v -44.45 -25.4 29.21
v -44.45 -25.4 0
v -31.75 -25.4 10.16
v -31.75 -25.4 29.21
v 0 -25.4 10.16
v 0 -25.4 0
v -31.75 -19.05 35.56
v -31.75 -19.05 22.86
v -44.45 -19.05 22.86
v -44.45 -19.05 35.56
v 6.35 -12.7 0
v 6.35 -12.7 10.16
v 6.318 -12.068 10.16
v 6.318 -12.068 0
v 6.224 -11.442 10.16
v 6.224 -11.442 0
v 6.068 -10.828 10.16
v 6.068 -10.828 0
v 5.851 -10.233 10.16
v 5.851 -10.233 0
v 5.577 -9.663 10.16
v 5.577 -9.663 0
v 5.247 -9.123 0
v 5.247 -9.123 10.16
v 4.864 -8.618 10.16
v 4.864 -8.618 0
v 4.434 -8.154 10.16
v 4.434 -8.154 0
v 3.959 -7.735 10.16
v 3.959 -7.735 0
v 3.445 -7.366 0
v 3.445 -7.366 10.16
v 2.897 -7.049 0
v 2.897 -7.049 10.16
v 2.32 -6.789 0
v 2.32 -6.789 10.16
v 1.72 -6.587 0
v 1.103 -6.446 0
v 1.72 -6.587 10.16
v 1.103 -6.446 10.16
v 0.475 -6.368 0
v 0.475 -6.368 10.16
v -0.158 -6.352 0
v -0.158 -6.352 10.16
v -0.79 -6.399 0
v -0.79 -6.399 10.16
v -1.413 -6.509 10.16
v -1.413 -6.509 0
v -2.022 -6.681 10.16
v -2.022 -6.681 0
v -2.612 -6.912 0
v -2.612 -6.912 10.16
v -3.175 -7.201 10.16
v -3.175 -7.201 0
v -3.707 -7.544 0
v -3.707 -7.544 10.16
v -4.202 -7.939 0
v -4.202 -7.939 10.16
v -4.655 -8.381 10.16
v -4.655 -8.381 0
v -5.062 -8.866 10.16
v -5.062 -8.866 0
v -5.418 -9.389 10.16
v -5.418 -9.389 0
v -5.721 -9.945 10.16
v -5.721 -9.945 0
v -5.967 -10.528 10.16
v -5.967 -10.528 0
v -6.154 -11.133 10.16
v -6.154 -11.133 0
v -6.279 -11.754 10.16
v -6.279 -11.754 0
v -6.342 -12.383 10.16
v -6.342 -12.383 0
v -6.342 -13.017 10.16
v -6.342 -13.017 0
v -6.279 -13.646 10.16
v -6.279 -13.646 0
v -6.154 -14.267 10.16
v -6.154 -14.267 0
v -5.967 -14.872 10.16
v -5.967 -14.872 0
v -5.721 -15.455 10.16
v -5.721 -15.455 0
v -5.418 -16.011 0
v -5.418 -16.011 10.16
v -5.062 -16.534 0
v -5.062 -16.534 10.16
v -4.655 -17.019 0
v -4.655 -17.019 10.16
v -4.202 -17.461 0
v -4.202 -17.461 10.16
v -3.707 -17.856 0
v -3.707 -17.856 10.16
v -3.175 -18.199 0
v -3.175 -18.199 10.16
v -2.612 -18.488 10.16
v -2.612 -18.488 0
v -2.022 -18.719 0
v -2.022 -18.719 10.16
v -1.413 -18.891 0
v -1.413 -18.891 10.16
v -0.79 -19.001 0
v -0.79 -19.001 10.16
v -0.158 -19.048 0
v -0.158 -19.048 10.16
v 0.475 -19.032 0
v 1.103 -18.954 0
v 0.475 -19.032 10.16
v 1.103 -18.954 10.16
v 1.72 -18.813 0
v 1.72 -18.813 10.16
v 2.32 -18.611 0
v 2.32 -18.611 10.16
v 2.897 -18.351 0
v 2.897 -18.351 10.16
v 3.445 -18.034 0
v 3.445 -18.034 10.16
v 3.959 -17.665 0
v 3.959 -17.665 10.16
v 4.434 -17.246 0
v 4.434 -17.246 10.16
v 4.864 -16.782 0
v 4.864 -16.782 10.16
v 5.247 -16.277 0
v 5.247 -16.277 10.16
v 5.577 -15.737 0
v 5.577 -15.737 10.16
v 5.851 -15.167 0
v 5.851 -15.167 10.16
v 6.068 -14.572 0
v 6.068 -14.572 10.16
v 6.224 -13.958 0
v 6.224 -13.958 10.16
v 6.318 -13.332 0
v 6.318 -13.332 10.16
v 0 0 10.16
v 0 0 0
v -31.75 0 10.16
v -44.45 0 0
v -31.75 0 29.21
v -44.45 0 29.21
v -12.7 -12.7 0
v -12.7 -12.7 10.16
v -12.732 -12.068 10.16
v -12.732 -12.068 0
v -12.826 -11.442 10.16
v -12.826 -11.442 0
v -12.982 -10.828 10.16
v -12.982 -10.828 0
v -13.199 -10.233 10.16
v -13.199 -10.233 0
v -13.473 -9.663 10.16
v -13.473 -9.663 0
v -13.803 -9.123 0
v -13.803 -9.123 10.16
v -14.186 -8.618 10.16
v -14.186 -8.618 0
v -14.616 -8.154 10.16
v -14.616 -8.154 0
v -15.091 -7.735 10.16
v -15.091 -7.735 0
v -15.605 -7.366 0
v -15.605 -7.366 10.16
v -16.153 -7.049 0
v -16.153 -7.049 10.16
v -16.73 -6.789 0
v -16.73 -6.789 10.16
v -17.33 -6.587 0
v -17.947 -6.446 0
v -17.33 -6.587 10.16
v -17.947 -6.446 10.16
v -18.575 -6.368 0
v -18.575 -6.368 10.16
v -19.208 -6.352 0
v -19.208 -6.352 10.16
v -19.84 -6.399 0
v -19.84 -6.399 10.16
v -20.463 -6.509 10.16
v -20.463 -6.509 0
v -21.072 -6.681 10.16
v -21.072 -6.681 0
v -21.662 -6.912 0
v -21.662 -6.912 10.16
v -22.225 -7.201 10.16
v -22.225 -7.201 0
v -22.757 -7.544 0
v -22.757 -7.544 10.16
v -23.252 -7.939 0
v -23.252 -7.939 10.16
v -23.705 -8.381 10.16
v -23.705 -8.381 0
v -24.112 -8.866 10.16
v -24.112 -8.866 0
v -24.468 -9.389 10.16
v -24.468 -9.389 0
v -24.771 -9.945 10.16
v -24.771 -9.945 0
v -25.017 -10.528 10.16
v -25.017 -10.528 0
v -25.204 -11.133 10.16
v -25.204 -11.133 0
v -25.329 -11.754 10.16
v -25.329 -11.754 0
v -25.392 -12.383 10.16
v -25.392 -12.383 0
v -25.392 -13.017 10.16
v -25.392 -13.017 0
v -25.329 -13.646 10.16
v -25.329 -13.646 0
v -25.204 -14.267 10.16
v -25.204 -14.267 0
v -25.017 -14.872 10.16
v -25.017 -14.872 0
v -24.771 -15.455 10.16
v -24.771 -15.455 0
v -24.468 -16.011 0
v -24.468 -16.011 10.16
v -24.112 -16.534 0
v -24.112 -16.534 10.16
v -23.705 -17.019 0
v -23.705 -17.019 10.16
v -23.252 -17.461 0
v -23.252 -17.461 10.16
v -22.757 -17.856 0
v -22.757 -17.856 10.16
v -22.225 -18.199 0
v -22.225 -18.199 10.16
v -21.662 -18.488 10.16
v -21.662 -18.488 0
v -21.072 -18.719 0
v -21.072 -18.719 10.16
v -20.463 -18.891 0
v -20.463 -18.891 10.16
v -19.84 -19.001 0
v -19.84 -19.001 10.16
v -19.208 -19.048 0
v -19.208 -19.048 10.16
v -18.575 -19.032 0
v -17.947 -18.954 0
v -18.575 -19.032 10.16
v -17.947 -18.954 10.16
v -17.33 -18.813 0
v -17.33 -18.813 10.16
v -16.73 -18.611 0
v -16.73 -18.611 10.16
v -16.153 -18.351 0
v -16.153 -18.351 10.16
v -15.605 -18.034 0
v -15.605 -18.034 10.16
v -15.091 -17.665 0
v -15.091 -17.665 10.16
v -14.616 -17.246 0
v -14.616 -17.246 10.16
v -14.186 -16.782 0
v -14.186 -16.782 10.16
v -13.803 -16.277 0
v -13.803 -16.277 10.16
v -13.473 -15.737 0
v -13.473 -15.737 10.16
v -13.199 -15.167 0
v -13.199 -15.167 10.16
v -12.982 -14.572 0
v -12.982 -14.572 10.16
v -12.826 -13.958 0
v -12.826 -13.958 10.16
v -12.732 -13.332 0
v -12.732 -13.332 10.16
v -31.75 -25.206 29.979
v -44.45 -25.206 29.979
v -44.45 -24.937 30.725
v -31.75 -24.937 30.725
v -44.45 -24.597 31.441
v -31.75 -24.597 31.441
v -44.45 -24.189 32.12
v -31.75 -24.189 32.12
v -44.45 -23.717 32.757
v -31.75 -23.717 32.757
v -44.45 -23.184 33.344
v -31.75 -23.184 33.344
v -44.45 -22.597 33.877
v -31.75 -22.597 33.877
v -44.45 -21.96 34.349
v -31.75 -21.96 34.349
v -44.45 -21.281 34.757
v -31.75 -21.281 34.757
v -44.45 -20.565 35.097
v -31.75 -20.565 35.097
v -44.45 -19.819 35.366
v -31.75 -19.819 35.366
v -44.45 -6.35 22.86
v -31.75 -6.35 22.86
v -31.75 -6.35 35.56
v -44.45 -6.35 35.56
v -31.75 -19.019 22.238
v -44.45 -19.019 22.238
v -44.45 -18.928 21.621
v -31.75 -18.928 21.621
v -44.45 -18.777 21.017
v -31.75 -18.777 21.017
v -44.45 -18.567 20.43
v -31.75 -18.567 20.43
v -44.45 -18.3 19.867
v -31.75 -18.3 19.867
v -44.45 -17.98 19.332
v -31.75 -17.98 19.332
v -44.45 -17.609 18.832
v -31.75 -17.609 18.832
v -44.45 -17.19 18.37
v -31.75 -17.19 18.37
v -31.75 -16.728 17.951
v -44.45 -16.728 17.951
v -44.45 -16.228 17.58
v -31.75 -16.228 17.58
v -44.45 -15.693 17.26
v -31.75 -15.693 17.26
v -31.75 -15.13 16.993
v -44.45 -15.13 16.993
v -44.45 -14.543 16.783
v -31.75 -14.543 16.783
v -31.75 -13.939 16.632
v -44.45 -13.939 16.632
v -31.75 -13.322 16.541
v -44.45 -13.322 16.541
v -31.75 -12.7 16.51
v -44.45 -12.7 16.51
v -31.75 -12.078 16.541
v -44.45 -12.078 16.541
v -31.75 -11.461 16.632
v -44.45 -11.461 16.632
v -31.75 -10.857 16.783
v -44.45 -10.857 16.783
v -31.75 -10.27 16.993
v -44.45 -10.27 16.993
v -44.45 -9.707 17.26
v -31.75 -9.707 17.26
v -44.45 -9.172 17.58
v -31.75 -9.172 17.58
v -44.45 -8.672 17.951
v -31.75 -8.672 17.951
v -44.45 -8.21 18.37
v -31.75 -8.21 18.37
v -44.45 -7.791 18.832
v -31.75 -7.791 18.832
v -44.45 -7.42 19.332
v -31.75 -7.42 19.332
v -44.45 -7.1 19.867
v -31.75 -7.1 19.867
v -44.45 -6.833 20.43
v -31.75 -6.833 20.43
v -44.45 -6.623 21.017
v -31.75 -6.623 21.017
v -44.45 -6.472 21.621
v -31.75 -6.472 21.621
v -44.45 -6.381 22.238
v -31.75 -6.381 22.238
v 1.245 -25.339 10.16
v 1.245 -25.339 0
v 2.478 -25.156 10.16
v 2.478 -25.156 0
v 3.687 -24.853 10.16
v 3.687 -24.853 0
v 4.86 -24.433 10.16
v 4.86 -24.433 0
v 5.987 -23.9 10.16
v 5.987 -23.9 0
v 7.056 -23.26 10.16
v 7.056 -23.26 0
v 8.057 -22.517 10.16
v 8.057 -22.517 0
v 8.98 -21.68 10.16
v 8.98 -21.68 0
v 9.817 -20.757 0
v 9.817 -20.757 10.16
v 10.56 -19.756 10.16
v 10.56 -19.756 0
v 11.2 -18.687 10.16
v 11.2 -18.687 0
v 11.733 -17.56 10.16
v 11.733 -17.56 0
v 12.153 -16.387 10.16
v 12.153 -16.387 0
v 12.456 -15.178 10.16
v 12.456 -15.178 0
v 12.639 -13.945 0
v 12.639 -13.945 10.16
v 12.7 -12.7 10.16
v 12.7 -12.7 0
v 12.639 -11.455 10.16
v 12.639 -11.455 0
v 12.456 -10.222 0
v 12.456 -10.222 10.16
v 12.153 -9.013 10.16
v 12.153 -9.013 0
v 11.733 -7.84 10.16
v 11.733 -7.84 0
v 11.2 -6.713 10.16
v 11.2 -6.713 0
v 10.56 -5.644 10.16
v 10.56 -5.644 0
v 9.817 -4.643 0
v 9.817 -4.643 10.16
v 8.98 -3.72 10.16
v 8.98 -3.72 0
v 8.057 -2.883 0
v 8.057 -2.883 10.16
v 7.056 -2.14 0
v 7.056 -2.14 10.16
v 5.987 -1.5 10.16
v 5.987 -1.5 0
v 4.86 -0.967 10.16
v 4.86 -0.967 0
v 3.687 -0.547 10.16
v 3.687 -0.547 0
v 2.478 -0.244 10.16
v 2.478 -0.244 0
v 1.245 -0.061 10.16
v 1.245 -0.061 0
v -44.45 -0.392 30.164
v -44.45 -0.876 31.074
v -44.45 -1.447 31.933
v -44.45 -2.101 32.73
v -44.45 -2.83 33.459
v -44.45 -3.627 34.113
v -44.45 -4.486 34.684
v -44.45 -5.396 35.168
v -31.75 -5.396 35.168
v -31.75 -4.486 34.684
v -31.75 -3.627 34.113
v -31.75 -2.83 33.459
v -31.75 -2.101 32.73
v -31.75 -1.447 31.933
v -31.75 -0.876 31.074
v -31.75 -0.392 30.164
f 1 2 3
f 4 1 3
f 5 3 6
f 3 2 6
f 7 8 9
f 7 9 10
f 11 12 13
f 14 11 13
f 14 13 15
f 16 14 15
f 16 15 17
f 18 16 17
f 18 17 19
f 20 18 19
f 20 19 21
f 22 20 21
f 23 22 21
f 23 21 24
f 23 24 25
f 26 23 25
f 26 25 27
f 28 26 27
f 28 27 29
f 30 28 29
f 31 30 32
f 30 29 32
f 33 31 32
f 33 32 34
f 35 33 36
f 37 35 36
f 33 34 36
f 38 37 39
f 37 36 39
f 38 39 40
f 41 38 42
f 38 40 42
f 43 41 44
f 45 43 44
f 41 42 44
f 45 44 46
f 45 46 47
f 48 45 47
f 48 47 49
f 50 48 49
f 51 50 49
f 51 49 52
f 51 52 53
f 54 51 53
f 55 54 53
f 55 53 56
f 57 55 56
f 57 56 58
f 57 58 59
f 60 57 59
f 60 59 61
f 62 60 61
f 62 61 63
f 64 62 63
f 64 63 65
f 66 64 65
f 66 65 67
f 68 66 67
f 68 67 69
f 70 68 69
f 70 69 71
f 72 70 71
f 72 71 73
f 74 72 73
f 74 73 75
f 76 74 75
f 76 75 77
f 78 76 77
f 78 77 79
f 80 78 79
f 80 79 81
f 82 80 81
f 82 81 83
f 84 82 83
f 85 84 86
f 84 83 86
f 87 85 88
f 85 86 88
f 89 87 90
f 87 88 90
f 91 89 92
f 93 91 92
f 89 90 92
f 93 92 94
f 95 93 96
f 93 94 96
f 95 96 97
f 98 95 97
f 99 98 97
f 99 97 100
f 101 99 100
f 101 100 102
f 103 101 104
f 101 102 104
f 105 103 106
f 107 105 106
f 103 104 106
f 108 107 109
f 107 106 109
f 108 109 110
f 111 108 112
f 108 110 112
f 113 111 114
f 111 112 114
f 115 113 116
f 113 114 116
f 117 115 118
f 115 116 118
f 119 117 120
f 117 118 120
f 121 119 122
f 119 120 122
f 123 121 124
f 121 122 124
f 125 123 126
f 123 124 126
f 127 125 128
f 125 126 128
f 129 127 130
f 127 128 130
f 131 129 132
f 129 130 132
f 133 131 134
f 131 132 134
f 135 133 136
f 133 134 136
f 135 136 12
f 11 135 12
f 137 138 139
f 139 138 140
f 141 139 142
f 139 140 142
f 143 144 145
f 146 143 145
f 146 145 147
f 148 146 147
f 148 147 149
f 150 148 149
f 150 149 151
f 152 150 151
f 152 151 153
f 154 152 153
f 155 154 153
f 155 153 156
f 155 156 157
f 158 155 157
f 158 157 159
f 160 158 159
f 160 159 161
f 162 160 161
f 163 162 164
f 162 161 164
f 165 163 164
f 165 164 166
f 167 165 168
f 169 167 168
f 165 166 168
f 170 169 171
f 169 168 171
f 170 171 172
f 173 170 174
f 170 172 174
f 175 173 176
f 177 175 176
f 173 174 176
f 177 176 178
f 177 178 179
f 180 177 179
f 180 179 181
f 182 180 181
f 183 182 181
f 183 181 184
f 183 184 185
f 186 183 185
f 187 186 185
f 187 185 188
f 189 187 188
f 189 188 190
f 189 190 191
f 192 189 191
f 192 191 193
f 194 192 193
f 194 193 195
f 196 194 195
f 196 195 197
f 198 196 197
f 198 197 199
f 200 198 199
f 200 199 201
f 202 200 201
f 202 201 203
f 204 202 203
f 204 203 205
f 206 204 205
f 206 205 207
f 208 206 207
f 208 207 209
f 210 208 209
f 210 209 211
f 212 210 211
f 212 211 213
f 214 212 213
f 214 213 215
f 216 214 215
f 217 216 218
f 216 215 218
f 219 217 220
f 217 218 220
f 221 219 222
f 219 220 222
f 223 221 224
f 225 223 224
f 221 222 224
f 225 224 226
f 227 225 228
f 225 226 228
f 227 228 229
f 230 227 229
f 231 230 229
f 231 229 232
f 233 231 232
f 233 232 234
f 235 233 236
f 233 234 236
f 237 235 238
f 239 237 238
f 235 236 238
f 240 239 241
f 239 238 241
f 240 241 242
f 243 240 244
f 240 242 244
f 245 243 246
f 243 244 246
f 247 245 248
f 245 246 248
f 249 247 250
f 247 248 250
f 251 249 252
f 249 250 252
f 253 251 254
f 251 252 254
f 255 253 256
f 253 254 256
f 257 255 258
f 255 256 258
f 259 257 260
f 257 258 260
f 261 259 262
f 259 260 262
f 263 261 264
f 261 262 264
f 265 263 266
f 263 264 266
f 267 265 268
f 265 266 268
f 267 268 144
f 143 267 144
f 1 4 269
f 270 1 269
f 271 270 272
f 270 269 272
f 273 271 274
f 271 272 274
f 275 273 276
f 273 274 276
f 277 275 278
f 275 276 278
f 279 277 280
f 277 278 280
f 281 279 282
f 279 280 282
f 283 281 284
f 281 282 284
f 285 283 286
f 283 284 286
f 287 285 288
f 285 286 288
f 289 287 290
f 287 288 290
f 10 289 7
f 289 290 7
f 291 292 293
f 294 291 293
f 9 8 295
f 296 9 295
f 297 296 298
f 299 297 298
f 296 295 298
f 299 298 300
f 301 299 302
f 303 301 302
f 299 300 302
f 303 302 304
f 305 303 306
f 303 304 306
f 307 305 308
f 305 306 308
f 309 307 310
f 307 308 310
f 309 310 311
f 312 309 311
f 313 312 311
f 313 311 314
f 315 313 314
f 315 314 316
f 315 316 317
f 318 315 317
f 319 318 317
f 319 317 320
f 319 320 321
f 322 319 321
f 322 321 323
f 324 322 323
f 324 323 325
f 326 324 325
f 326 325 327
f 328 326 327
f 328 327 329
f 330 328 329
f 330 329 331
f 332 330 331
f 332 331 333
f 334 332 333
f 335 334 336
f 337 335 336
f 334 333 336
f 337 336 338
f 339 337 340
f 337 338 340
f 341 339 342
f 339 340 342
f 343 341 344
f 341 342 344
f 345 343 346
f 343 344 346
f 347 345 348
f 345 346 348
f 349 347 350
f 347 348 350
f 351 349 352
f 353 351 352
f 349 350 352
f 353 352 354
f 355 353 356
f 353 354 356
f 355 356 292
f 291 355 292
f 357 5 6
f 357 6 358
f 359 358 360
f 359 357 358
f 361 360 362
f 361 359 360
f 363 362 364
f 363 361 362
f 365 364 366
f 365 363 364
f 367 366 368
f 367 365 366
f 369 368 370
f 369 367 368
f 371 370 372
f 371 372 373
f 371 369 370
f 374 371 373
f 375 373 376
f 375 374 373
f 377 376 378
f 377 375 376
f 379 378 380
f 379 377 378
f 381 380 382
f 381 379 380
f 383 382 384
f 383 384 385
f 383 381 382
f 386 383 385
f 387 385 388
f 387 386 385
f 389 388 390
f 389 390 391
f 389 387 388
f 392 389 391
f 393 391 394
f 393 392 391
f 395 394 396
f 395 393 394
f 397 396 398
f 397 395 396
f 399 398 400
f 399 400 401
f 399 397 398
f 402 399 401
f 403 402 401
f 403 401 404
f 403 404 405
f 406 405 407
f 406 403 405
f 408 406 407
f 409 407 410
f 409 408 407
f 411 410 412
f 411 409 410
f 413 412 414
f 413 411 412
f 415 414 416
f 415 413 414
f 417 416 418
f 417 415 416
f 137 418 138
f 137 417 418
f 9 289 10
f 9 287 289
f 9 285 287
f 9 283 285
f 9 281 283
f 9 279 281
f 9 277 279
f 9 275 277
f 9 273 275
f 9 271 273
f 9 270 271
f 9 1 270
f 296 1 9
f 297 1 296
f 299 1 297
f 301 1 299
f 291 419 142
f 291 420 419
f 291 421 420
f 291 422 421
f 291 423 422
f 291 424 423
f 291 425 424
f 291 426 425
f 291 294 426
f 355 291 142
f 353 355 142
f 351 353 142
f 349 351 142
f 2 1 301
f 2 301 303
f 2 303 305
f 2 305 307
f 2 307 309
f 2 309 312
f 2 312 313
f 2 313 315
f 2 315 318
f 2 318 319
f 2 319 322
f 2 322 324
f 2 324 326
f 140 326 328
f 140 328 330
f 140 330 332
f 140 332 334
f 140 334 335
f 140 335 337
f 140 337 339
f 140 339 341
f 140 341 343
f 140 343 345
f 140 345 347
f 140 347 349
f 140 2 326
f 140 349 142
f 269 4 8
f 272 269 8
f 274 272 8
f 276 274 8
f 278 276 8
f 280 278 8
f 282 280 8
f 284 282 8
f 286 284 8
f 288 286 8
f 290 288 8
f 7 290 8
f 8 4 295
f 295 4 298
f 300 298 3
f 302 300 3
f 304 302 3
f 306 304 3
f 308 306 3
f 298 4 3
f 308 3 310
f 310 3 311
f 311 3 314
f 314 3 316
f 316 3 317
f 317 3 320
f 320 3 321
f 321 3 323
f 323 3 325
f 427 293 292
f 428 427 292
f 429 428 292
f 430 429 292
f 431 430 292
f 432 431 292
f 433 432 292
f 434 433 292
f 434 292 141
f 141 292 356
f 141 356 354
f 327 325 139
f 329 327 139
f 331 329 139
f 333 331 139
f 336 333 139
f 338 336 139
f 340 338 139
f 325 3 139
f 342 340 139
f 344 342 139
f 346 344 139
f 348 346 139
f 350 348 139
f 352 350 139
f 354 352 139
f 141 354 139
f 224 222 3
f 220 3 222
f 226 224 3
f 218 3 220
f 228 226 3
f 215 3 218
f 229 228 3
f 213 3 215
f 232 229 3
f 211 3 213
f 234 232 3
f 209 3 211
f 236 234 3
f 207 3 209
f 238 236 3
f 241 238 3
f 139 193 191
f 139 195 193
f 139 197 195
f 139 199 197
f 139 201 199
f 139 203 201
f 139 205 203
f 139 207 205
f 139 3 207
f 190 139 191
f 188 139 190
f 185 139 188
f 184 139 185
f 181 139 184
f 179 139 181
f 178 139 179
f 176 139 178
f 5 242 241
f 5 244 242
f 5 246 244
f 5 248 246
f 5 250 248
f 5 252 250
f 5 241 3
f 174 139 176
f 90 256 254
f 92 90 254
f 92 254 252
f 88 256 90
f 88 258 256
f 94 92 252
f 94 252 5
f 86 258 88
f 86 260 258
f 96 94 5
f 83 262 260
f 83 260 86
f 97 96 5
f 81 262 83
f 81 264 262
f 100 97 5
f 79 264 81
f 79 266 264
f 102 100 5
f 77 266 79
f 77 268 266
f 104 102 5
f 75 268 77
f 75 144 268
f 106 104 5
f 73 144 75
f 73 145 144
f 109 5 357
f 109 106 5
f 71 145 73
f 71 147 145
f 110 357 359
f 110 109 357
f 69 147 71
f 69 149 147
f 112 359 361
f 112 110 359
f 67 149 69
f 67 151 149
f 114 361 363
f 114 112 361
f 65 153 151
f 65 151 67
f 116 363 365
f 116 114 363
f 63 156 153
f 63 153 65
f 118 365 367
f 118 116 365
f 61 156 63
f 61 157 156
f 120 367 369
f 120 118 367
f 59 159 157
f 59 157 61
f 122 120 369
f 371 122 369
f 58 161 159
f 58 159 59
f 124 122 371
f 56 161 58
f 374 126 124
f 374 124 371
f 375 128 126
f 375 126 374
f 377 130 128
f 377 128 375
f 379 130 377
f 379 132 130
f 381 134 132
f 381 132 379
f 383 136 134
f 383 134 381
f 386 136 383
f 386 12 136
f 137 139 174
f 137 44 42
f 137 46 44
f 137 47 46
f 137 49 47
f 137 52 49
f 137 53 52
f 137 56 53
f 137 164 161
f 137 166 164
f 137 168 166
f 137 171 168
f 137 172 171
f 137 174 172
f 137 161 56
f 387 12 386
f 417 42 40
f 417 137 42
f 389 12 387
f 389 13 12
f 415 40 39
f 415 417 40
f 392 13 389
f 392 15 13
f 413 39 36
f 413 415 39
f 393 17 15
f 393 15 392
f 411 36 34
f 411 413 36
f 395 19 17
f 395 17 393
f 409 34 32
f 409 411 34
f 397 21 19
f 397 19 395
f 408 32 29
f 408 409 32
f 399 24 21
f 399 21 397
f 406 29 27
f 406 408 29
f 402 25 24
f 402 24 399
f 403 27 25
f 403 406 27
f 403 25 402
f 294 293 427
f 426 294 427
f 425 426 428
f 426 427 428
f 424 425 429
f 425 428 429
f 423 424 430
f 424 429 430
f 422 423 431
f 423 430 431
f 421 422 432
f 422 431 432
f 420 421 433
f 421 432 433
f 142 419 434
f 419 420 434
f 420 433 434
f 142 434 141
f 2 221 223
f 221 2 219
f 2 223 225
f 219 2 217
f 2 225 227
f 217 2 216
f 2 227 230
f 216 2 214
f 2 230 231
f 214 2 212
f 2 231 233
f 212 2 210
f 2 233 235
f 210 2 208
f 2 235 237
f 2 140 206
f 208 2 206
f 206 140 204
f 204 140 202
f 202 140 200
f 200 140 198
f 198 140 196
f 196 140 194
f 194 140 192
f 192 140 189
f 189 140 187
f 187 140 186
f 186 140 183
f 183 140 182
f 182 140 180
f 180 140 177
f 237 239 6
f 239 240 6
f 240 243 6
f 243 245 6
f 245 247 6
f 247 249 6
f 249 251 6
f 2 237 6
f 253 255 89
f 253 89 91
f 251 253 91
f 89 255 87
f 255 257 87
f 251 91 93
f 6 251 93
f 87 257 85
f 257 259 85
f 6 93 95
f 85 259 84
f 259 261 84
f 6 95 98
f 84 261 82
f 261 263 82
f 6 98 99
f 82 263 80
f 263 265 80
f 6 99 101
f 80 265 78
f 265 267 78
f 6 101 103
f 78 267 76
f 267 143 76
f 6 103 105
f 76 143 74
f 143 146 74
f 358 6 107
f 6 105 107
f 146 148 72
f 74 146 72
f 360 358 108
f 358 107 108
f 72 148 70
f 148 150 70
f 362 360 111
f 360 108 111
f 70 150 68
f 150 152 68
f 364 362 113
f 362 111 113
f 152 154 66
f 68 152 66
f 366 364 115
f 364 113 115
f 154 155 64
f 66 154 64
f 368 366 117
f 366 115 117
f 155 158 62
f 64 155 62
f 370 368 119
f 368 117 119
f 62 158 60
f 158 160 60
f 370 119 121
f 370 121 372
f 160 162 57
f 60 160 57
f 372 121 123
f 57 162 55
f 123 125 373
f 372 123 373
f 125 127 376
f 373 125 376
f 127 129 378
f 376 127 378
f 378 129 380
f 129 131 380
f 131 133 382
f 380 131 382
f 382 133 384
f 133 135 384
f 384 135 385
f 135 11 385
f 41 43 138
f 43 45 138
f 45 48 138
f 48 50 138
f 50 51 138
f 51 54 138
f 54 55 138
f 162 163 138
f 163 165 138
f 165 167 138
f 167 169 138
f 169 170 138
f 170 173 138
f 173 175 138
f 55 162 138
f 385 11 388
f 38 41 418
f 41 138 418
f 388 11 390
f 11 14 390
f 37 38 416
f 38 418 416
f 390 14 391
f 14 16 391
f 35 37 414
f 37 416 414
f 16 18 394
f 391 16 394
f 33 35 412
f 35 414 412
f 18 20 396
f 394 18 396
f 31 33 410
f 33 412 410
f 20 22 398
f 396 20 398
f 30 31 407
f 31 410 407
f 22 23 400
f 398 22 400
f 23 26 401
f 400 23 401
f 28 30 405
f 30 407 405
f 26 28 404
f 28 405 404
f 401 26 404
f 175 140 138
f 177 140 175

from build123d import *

# Parameters (mm, degrees)
F0_W      = 44.45
F0_H      = 10.16
F1_DEPTH  = 25.4
F3_DEPTH  = 10.16
F4_W      = 12.7
F4_H      = 25.4
F5_DEPTH  = 19.05
F6_DEPTH  = 6.35
F9_DEPTH  = 25.4
F10_DEPTH = 25.4
F11_DEPTH = 50.8
F12_W     = 12.7
F12_H     = 12.7
F13_DEPTH = 25.4
F14_R     = 6.35
F15_DEPTH = 25.4
F16_R     = 6.35
F17_DEPTH = 25.4


with BuildPart() as f1:
    # F0 (on Front) → F1 (new body)
    with BuildSketch(Plane.XZ):
        with Locations((-22.225, 5.08)):
            Rectangle(F0_W, F0_H)
    extrude(amount=F1_DEPTH)

    # F2 (on face) → F3 (join)
    with BuildSketch(Plane.XY.offset(10.16)):
        with BuildLine():
            Line((0, 0), (0, -25.4))
            ThreePointArc((0, -25.4), (12.7, -12.7), (0, 0))
        make_face()
    extrude(amount=-F3_DEPTH)

    # F4 (on face) → F5 (join)
    with BuildSketch(Plane.XY.offset(10.16)):
        with Locations((-38.1, -12.7)):
            Rectangle(F4_W, F4_H)
    extrude(amount=F5_DEPTH)

    # F6 (add): a face of the model
    f6_faces = [f1.faces().sort_by_distance(p)[0] for p in [
        (-38.1, -12.7, 29.21),
    ]]
    extrude(f6_faces, amount=F6_DEPTH)

    # F7 (on face) → F9 (cut)
    with BuildSketch(Plane.YZ.offset(-31.75)):
        with BuildLine():
            ThreePointArc((-25.4, 29.21), (-23.1840796039, 33.3440796039), (-19.05, 35.56))
            Line((-19.05, 35.56), (-25.4, 35.56))
            Line((-25.4, 35.56), (-25.4, 29.21))
        make_face()
    extrude(amount=-F9_DEPTH, mode=Mode.SUBTRACT)

    # F8 (on face) → F10 (join)
    with BuildSketch(Plane.YZ.offset(-31.75)):
        with BuildLine():
            ThreePointArc((-6.35, 35.56), (-2.4561746111, 33.1038253889), (0, 29.21))
            Line((0, 29.21), (0, 35.56))
            Line((0, 35.56), (-6.35, 35.56))
        make_face()
    extrude(amount=F10_DEPTH)

    # F11 (cut): a face of the model
    f11_faces = [f1.faces().sort_by_distance(p)[0] for p in [
        (-6.35, -1.7790367602, 33.7809632398),
    ]]
    extrude(f11_faces, amount=-F11_DEPTH, mode=Mode.SUBTRACT)

    # F12 (on face) → F13 (cut)
    with BuildSketch(Plane.YZ.offset(-31.75)):
        with Locations((-12.7, 29.21)):
            Rectangle(F12_W, F12_H)
        with BuildLine():
            Line((-6.35, 22.86), (-19.05, 22.86))
            ThreePointArc((-19.05, 22.86), (-12.7, 16.51), (-6.35, 22.86))
        make_face()
    extrude(amount=-F13_DEPTH, mode=Mode.SUBTRACT)

    # F14 (on face) → F15 (cut)
    with BuildSketch(Plane.XY.offset(10.16)):
        with Locations((-19.05, -12.7)):
            Circle(F14_R)
    extrude(amount=-F15_DEPTH, mode=Mode.SUBTRACT)

    # F16 (on face) → F17 (cut)
    with BuildSketch(Plane.XY.offset(10.16)):
        with Locations((0, -12.7)):
            Circle(F16_R)
    extrude(amount=-F17_DEPTH, mode=Mode.SUBTRACT)


solid = f1.part
